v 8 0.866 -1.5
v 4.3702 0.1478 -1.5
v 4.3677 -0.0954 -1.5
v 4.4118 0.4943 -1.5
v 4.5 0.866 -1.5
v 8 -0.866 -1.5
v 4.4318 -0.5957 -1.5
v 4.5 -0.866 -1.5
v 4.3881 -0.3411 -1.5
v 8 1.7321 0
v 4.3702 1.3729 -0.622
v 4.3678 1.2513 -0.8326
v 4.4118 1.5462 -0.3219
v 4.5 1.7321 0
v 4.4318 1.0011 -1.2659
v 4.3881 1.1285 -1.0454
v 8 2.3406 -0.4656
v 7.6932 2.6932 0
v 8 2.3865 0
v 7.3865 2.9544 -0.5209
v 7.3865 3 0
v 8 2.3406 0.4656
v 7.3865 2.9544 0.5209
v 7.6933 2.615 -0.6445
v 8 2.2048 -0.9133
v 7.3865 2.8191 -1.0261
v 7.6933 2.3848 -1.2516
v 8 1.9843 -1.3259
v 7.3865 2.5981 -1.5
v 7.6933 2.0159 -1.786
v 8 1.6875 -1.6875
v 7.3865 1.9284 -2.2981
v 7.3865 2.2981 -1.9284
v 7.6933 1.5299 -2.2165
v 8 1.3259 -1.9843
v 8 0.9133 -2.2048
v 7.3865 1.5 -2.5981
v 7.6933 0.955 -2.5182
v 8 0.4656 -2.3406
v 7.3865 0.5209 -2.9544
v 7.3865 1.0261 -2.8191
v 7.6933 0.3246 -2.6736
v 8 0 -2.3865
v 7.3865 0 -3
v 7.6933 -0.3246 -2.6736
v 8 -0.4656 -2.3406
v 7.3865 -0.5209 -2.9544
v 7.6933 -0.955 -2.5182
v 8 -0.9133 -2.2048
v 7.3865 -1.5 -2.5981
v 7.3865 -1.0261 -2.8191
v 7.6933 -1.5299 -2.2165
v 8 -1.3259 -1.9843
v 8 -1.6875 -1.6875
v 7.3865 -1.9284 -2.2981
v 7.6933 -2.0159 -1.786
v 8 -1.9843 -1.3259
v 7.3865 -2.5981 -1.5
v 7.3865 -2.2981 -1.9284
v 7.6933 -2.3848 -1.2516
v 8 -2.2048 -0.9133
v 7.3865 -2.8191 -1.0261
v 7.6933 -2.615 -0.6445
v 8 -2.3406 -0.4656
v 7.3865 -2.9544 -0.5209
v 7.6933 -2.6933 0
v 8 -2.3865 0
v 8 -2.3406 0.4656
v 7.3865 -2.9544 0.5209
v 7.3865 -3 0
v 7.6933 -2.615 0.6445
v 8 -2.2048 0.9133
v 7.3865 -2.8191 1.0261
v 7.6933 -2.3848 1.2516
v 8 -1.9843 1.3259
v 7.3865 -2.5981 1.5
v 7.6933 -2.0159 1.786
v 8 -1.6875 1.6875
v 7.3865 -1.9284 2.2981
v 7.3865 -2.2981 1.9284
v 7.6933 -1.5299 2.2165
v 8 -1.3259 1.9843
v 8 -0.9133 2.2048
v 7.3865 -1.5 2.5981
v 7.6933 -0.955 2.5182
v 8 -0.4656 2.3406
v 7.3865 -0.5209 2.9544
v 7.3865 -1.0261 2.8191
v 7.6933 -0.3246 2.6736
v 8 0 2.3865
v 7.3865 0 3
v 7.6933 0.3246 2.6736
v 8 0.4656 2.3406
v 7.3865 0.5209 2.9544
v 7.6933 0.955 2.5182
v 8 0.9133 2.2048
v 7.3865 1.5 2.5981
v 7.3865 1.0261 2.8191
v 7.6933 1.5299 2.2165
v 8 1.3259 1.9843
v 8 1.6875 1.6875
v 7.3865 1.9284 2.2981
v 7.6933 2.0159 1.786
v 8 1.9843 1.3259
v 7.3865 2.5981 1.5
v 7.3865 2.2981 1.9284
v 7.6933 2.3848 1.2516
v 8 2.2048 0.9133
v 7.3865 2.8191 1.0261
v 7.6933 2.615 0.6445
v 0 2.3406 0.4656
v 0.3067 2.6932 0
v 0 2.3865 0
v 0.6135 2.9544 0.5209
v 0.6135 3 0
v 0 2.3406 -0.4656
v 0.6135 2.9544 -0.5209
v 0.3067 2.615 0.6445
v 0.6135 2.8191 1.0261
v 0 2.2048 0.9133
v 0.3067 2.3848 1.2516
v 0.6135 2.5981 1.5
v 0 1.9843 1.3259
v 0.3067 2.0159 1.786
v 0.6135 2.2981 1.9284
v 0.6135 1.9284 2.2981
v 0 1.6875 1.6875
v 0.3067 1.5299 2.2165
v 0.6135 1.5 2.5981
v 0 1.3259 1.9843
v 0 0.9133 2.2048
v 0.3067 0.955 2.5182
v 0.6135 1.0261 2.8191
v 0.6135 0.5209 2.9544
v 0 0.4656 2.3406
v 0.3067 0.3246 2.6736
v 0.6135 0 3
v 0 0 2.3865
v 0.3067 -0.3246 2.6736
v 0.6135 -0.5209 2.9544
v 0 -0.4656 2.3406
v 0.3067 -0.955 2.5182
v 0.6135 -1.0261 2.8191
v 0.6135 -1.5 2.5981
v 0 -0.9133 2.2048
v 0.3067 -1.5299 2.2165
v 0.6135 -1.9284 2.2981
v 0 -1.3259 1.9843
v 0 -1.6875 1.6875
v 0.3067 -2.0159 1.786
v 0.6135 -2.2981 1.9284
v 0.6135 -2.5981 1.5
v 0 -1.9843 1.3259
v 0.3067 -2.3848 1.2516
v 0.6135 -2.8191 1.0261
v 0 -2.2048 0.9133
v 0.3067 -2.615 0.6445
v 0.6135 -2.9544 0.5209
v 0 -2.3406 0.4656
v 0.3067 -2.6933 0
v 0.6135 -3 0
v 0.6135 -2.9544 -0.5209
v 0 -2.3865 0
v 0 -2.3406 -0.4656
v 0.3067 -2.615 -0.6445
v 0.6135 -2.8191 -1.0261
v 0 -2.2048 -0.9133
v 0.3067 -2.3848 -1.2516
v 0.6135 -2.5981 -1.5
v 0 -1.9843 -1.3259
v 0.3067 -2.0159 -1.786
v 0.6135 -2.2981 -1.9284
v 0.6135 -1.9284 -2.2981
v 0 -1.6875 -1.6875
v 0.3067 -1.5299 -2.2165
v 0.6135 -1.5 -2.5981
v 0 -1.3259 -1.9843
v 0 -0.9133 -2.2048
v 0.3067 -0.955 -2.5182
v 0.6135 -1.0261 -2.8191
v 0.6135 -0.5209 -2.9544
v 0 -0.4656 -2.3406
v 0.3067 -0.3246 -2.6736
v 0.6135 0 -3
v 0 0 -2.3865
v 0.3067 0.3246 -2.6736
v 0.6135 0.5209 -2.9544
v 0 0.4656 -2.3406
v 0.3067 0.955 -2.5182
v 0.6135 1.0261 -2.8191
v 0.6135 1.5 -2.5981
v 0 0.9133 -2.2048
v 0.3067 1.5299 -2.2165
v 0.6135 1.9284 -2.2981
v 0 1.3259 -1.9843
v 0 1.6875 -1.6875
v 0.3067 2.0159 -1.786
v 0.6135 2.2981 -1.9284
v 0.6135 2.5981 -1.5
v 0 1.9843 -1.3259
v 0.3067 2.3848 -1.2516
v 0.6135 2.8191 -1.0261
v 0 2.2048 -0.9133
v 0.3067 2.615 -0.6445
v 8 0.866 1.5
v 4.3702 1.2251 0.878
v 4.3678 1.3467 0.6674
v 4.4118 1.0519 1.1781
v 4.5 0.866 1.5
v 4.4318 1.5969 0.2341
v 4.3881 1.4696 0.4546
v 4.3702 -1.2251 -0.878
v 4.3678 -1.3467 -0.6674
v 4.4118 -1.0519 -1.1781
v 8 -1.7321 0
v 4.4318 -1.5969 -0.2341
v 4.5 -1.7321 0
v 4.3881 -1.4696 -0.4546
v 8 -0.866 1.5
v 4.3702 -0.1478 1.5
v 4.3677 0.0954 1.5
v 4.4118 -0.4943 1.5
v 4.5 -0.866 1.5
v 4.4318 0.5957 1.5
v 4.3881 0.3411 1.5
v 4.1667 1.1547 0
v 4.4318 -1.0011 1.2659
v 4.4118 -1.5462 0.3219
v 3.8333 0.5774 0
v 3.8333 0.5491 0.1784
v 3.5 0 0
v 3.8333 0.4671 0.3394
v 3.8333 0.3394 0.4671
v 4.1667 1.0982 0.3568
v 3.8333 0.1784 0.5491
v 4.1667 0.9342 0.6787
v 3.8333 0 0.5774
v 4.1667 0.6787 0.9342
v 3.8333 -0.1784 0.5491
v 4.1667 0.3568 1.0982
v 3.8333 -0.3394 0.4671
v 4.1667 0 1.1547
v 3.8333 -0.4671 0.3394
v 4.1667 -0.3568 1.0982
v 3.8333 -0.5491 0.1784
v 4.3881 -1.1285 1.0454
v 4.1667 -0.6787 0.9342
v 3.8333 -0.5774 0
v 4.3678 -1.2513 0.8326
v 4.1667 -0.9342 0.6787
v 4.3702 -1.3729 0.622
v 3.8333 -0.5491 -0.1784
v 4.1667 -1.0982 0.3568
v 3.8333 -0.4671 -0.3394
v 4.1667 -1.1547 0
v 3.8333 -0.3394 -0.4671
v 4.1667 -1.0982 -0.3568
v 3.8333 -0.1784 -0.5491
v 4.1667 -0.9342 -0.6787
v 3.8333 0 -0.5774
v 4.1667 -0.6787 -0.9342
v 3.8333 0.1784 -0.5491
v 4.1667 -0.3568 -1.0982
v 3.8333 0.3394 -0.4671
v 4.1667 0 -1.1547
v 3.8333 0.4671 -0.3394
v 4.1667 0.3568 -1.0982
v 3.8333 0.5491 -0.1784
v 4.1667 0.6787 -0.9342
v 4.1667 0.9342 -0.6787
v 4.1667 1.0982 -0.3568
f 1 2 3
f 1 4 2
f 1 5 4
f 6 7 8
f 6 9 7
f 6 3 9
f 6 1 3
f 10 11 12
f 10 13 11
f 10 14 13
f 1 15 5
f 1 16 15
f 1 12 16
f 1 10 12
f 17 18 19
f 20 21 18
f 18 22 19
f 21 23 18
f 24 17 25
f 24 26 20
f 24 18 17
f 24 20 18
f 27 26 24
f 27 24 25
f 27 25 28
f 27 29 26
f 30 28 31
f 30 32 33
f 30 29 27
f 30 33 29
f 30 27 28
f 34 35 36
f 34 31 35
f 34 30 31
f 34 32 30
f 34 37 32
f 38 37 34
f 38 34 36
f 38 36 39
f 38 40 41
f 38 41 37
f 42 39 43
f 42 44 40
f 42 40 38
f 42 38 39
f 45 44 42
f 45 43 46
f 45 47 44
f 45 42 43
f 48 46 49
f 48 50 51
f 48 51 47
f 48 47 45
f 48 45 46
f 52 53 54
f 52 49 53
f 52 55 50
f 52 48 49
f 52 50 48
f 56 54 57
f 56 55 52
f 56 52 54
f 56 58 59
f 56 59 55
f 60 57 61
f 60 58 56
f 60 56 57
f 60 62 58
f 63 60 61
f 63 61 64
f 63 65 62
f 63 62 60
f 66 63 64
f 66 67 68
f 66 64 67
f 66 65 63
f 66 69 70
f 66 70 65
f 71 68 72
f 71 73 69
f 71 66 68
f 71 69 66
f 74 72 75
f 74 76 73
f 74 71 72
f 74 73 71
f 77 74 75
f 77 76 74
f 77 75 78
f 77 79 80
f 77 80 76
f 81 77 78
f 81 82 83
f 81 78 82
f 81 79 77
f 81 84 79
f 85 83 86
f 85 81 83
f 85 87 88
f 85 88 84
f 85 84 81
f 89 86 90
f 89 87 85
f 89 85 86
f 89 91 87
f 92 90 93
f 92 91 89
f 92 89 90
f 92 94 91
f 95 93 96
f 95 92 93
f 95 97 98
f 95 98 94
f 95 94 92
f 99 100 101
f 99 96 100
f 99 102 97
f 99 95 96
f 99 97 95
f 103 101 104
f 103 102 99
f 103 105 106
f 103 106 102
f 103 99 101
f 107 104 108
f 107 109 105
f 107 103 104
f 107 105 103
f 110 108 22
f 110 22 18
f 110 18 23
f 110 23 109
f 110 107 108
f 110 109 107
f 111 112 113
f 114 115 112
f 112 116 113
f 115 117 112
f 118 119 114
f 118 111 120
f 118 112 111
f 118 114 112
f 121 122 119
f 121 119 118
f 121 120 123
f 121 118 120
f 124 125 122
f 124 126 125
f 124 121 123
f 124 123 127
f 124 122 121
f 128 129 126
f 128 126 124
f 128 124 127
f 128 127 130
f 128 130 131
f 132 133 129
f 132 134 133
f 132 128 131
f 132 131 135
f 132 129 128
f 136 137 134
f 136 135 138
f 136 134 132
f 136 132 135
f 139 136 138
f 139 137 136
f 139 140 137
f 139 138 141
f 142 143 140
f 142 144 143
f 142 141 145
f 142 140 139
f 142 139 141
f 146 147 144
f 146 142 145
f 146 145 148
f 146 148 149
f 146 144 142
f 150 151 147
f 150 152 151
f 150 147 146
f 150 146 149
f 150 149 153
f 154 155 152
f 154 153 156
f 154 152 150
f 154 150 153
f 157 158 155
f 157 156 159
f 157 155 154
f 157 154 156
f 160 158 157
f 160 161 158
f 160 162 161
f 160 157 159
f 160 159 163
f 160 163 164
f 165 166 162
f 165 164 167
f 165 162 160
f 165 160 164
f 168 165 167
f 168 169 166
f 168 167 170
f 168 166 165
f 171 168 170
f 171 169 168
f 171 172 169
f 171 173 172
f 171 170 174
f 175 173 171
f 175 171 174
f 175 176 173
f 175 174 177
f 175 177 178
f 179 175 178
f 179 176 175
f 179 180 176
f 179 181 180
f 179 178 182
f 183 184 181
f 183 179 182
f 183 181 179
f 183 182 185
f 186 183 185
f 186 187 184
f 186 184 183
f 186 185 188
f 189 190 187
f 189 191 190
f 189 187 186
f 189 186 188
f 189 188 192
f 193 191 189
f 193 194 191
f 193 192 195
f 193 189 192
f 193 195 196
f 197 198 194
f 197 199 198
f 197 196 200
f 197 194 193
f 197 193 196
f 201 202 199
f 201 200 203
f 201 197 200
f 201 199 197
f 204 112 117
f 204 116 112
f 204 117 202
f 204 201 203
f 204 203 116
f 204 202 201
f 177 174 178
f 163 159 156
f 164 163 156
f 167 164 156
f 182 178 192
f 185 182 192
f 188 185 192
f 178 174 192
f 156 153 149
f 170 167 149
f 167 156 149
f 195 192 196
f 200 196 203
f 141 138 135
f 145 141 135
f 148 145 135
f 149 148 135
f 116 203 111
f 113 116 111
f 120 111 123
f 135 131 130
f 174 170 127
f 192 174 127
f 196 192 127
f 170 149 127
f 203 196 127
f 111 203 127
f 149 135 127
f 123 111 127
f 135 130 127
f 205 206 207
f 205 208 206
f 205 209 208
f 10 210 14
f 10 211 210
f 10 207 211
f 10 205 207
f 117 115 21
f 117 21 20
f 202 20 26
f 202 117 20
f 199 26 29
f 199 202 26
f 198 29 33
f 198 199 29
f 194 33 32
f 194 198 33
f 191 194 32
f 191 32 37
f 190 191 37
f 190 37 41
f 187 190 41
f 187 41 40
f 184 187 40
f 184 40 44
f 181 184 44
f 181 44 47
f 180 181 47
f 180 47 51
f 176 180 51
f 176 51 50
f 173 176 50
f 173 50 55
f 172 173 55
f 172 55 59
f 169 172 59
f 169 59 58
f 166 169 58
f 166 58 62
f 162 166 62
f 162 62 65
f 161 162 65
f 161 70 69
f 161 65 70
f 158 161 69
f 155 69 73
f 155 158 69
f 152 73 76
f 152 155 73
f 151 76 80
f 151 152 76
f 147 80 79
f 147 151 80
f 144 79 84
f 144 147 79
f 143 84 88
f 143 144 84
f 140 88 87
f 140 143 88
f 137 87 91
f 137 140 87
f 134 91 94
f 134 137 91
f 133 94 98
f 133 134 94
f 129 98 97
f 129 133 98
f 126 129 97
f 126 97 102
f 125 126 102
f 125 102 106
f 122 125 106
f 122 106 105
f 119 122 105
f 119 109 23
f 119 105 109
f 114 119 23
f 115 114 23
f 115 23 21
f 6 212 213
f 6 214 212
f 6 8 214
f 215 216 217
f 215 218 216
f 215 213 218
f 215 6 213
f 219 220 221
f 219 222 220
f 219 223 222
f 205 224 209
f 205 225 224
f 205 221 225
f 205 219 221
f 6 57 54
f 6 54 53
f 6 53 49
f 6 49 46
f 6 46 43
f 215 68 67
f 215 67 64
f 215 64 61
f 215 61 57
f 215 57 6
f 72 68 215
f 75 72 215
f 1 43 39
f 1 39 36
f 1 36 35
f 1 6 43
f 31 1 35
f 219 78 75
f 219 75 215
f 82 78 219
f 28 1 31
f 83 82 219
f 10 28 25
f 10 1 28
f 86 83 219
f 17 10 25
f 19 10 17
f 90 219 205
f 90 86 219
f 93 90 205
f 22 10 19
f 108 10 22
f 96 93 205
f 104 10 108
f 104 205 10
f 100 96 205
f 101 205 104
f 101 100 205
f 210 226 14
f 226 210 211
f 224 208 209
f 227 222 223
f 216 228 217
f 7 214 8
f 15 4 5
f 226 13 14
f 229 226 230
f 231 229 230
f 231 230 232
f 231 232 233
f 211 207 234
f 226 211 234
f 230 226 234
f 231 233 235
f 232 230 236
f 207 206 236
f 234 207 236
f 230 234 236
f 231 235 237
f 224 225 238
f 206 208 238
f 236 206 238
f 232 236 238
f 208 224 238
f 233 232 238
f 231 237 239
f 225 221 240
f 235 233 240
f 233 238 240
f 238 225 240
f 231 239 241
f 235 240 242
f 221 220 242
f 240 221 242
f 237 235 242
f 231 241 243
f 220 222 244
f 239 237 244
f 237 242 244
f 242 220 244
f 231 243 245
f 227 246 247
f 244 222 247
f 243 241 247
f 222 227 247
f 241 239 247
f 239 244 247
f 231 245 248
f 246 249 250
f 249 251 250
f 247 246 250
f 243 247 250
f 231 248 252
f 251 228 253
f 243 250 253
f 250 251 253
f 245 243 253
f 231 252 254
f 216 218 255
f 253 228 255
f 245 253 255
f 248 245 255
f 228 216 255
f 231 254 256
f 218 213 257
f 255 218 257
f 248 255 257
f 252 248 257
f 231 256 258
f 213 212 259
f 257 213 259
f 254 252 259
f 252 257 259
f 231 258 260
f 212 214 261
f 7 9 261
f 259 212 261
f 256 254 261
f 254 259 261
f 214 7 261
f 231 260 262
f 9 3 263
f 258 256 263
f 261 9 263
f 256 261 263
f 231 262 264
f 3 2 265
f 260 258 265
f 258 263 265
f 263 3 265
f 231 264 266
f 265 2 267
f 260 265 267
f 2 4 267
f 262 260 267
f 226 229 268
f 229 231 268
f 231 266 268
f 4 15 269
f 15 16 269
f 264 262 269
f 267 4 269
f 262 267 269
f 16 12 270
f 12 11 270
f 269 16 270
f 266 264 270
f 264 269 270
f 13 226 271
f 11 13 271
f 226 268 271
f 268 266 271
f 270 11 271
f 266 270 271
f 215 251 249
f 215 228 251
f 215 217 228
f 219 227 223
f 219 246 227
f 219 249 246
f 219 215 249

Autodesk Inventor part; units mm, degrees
ref_plane "YZ Plane" through (0, 0, 0) normal (1, 0, 0) x (0, 1, 0)
ref_plane "XZ Plane" through (0, 0, 0) normal (0, 1, 0) x (-1, 0, 0)
sketch "Sketch1" plane through (0, 0, 0) normal (0, 0, 1) x (1, 0, 0)
  line L0 (0, 0) -> (3.5, 0)
  line L1 (8, 1.7321) -> (8, 3)
  line L2 (8, 3) -> (0, 3)
  line L3 (8, 1.7321) -> (4.5, 1.7321)
  line L4 (4.5, 1.7321) -> (3.5, 0)
  line L5 (0, -0.6) -> (0, 3.6) projected
  line L6 (0, 3) -> (0, 0)
  dimension "d0" = 3.5
  dimension "d1" = 60
  dimension "d2" = 6
  dimension "d3" = 3.4641
  dimension "d5" = 8
revolve "Body" add sketch "Sketch1" angle 360 about axis through (0, 0, 0) along (1, 0, 0)
sketch "Sketch2" plane through (8, 0, 0) normal (1, 0, 0) x (0, 1, 0)
  circle A0 centre (0, 0) radius 1.7321 projected
  line L0 (-0.866, 1.5) -> (0.866, 1.5)
  line L1 (0.866, 1.5) -> (1.7321, 0)
  line L2 (1.7321, 0) -> (0.866, -1.5)
  line L3 (0.866, -1.5) -> (-0.866, -1.5)
  line L4 (-0.866, -1.5) -> (-1.7321, 0)
  line L5 (-1.7321, 0) -> (-0.866, 1.5)
  point P0 (0, 0)
  point P1 (0, 0)
extrude "Slot" add sketch "Sketch2" against normal up to next contours L1 A0 | A0 L2 | L0 A0 | A0 L3 | L5 A0 | A0 L4
thread "Thread" size "M6x1" class "6g" standard "ISO Metric profile" length 8
chamfer "Chamfer1" distance 0.6135 angle 45 1 edges at (8, -3, 0) measured on face at (5.3333, 2.9612, -0.4812)
chamfer "Chamfer2" distance 0.6135 angle 45 1 edges at (0, -3, 0) measured on face at (4.9244, 2.9612, -0.4812)
ref_plane "Work Plane1" through (4, 0, 0) normal (0, 0, 1) x (1, 0, 0)
equation "\"d8\" = NLG"
equation "\"d10\" = -0.5 * GD1 + 0.5 * NND"
equation "\"d11\" = FAWI"
equation "\"d34\" = -0.5 * GD1 + 0.5 * NND"
equation "\"d12\" = -0.5 * GD1 + 0.5 * NND"
equation "\"d13\" = FAWI"
equation "\"d35\" = -0.5 * GD1 + 0.5 * NND"
equation "\"d0\" = INTI"
equation "\"d2\" = NND"
equation "\"d3\" = 1.1547 * SW"
equation "\"d5\" = NLG"
equation "\"NND\" = 6"
equation "\"NLG\" = 8"
equation "\"INTI\" = 3.5"
equation "\"FAWI\" = 45deg"
equation "\"SW\" = 3"
equation "\"GD1\" = THREADDIA - 1.2269 * PTC"
equation "\"SPD\" = 4"
equation "\"GUL\" = 0.61345 * PTC"
equation "\"TOA\" = 30deg"
equation "\"THREADDIA\" = 6"
equation "\"PTC\" = 1"
equation "\"FAWI1\" = 45deg"
equation "\"GAL\" = 0.61345 * PTC"
equation "\"E0\" = 1.155 * SW"
properties part number "DIN 913 - M6 x 8" material "Steel, Mild"
